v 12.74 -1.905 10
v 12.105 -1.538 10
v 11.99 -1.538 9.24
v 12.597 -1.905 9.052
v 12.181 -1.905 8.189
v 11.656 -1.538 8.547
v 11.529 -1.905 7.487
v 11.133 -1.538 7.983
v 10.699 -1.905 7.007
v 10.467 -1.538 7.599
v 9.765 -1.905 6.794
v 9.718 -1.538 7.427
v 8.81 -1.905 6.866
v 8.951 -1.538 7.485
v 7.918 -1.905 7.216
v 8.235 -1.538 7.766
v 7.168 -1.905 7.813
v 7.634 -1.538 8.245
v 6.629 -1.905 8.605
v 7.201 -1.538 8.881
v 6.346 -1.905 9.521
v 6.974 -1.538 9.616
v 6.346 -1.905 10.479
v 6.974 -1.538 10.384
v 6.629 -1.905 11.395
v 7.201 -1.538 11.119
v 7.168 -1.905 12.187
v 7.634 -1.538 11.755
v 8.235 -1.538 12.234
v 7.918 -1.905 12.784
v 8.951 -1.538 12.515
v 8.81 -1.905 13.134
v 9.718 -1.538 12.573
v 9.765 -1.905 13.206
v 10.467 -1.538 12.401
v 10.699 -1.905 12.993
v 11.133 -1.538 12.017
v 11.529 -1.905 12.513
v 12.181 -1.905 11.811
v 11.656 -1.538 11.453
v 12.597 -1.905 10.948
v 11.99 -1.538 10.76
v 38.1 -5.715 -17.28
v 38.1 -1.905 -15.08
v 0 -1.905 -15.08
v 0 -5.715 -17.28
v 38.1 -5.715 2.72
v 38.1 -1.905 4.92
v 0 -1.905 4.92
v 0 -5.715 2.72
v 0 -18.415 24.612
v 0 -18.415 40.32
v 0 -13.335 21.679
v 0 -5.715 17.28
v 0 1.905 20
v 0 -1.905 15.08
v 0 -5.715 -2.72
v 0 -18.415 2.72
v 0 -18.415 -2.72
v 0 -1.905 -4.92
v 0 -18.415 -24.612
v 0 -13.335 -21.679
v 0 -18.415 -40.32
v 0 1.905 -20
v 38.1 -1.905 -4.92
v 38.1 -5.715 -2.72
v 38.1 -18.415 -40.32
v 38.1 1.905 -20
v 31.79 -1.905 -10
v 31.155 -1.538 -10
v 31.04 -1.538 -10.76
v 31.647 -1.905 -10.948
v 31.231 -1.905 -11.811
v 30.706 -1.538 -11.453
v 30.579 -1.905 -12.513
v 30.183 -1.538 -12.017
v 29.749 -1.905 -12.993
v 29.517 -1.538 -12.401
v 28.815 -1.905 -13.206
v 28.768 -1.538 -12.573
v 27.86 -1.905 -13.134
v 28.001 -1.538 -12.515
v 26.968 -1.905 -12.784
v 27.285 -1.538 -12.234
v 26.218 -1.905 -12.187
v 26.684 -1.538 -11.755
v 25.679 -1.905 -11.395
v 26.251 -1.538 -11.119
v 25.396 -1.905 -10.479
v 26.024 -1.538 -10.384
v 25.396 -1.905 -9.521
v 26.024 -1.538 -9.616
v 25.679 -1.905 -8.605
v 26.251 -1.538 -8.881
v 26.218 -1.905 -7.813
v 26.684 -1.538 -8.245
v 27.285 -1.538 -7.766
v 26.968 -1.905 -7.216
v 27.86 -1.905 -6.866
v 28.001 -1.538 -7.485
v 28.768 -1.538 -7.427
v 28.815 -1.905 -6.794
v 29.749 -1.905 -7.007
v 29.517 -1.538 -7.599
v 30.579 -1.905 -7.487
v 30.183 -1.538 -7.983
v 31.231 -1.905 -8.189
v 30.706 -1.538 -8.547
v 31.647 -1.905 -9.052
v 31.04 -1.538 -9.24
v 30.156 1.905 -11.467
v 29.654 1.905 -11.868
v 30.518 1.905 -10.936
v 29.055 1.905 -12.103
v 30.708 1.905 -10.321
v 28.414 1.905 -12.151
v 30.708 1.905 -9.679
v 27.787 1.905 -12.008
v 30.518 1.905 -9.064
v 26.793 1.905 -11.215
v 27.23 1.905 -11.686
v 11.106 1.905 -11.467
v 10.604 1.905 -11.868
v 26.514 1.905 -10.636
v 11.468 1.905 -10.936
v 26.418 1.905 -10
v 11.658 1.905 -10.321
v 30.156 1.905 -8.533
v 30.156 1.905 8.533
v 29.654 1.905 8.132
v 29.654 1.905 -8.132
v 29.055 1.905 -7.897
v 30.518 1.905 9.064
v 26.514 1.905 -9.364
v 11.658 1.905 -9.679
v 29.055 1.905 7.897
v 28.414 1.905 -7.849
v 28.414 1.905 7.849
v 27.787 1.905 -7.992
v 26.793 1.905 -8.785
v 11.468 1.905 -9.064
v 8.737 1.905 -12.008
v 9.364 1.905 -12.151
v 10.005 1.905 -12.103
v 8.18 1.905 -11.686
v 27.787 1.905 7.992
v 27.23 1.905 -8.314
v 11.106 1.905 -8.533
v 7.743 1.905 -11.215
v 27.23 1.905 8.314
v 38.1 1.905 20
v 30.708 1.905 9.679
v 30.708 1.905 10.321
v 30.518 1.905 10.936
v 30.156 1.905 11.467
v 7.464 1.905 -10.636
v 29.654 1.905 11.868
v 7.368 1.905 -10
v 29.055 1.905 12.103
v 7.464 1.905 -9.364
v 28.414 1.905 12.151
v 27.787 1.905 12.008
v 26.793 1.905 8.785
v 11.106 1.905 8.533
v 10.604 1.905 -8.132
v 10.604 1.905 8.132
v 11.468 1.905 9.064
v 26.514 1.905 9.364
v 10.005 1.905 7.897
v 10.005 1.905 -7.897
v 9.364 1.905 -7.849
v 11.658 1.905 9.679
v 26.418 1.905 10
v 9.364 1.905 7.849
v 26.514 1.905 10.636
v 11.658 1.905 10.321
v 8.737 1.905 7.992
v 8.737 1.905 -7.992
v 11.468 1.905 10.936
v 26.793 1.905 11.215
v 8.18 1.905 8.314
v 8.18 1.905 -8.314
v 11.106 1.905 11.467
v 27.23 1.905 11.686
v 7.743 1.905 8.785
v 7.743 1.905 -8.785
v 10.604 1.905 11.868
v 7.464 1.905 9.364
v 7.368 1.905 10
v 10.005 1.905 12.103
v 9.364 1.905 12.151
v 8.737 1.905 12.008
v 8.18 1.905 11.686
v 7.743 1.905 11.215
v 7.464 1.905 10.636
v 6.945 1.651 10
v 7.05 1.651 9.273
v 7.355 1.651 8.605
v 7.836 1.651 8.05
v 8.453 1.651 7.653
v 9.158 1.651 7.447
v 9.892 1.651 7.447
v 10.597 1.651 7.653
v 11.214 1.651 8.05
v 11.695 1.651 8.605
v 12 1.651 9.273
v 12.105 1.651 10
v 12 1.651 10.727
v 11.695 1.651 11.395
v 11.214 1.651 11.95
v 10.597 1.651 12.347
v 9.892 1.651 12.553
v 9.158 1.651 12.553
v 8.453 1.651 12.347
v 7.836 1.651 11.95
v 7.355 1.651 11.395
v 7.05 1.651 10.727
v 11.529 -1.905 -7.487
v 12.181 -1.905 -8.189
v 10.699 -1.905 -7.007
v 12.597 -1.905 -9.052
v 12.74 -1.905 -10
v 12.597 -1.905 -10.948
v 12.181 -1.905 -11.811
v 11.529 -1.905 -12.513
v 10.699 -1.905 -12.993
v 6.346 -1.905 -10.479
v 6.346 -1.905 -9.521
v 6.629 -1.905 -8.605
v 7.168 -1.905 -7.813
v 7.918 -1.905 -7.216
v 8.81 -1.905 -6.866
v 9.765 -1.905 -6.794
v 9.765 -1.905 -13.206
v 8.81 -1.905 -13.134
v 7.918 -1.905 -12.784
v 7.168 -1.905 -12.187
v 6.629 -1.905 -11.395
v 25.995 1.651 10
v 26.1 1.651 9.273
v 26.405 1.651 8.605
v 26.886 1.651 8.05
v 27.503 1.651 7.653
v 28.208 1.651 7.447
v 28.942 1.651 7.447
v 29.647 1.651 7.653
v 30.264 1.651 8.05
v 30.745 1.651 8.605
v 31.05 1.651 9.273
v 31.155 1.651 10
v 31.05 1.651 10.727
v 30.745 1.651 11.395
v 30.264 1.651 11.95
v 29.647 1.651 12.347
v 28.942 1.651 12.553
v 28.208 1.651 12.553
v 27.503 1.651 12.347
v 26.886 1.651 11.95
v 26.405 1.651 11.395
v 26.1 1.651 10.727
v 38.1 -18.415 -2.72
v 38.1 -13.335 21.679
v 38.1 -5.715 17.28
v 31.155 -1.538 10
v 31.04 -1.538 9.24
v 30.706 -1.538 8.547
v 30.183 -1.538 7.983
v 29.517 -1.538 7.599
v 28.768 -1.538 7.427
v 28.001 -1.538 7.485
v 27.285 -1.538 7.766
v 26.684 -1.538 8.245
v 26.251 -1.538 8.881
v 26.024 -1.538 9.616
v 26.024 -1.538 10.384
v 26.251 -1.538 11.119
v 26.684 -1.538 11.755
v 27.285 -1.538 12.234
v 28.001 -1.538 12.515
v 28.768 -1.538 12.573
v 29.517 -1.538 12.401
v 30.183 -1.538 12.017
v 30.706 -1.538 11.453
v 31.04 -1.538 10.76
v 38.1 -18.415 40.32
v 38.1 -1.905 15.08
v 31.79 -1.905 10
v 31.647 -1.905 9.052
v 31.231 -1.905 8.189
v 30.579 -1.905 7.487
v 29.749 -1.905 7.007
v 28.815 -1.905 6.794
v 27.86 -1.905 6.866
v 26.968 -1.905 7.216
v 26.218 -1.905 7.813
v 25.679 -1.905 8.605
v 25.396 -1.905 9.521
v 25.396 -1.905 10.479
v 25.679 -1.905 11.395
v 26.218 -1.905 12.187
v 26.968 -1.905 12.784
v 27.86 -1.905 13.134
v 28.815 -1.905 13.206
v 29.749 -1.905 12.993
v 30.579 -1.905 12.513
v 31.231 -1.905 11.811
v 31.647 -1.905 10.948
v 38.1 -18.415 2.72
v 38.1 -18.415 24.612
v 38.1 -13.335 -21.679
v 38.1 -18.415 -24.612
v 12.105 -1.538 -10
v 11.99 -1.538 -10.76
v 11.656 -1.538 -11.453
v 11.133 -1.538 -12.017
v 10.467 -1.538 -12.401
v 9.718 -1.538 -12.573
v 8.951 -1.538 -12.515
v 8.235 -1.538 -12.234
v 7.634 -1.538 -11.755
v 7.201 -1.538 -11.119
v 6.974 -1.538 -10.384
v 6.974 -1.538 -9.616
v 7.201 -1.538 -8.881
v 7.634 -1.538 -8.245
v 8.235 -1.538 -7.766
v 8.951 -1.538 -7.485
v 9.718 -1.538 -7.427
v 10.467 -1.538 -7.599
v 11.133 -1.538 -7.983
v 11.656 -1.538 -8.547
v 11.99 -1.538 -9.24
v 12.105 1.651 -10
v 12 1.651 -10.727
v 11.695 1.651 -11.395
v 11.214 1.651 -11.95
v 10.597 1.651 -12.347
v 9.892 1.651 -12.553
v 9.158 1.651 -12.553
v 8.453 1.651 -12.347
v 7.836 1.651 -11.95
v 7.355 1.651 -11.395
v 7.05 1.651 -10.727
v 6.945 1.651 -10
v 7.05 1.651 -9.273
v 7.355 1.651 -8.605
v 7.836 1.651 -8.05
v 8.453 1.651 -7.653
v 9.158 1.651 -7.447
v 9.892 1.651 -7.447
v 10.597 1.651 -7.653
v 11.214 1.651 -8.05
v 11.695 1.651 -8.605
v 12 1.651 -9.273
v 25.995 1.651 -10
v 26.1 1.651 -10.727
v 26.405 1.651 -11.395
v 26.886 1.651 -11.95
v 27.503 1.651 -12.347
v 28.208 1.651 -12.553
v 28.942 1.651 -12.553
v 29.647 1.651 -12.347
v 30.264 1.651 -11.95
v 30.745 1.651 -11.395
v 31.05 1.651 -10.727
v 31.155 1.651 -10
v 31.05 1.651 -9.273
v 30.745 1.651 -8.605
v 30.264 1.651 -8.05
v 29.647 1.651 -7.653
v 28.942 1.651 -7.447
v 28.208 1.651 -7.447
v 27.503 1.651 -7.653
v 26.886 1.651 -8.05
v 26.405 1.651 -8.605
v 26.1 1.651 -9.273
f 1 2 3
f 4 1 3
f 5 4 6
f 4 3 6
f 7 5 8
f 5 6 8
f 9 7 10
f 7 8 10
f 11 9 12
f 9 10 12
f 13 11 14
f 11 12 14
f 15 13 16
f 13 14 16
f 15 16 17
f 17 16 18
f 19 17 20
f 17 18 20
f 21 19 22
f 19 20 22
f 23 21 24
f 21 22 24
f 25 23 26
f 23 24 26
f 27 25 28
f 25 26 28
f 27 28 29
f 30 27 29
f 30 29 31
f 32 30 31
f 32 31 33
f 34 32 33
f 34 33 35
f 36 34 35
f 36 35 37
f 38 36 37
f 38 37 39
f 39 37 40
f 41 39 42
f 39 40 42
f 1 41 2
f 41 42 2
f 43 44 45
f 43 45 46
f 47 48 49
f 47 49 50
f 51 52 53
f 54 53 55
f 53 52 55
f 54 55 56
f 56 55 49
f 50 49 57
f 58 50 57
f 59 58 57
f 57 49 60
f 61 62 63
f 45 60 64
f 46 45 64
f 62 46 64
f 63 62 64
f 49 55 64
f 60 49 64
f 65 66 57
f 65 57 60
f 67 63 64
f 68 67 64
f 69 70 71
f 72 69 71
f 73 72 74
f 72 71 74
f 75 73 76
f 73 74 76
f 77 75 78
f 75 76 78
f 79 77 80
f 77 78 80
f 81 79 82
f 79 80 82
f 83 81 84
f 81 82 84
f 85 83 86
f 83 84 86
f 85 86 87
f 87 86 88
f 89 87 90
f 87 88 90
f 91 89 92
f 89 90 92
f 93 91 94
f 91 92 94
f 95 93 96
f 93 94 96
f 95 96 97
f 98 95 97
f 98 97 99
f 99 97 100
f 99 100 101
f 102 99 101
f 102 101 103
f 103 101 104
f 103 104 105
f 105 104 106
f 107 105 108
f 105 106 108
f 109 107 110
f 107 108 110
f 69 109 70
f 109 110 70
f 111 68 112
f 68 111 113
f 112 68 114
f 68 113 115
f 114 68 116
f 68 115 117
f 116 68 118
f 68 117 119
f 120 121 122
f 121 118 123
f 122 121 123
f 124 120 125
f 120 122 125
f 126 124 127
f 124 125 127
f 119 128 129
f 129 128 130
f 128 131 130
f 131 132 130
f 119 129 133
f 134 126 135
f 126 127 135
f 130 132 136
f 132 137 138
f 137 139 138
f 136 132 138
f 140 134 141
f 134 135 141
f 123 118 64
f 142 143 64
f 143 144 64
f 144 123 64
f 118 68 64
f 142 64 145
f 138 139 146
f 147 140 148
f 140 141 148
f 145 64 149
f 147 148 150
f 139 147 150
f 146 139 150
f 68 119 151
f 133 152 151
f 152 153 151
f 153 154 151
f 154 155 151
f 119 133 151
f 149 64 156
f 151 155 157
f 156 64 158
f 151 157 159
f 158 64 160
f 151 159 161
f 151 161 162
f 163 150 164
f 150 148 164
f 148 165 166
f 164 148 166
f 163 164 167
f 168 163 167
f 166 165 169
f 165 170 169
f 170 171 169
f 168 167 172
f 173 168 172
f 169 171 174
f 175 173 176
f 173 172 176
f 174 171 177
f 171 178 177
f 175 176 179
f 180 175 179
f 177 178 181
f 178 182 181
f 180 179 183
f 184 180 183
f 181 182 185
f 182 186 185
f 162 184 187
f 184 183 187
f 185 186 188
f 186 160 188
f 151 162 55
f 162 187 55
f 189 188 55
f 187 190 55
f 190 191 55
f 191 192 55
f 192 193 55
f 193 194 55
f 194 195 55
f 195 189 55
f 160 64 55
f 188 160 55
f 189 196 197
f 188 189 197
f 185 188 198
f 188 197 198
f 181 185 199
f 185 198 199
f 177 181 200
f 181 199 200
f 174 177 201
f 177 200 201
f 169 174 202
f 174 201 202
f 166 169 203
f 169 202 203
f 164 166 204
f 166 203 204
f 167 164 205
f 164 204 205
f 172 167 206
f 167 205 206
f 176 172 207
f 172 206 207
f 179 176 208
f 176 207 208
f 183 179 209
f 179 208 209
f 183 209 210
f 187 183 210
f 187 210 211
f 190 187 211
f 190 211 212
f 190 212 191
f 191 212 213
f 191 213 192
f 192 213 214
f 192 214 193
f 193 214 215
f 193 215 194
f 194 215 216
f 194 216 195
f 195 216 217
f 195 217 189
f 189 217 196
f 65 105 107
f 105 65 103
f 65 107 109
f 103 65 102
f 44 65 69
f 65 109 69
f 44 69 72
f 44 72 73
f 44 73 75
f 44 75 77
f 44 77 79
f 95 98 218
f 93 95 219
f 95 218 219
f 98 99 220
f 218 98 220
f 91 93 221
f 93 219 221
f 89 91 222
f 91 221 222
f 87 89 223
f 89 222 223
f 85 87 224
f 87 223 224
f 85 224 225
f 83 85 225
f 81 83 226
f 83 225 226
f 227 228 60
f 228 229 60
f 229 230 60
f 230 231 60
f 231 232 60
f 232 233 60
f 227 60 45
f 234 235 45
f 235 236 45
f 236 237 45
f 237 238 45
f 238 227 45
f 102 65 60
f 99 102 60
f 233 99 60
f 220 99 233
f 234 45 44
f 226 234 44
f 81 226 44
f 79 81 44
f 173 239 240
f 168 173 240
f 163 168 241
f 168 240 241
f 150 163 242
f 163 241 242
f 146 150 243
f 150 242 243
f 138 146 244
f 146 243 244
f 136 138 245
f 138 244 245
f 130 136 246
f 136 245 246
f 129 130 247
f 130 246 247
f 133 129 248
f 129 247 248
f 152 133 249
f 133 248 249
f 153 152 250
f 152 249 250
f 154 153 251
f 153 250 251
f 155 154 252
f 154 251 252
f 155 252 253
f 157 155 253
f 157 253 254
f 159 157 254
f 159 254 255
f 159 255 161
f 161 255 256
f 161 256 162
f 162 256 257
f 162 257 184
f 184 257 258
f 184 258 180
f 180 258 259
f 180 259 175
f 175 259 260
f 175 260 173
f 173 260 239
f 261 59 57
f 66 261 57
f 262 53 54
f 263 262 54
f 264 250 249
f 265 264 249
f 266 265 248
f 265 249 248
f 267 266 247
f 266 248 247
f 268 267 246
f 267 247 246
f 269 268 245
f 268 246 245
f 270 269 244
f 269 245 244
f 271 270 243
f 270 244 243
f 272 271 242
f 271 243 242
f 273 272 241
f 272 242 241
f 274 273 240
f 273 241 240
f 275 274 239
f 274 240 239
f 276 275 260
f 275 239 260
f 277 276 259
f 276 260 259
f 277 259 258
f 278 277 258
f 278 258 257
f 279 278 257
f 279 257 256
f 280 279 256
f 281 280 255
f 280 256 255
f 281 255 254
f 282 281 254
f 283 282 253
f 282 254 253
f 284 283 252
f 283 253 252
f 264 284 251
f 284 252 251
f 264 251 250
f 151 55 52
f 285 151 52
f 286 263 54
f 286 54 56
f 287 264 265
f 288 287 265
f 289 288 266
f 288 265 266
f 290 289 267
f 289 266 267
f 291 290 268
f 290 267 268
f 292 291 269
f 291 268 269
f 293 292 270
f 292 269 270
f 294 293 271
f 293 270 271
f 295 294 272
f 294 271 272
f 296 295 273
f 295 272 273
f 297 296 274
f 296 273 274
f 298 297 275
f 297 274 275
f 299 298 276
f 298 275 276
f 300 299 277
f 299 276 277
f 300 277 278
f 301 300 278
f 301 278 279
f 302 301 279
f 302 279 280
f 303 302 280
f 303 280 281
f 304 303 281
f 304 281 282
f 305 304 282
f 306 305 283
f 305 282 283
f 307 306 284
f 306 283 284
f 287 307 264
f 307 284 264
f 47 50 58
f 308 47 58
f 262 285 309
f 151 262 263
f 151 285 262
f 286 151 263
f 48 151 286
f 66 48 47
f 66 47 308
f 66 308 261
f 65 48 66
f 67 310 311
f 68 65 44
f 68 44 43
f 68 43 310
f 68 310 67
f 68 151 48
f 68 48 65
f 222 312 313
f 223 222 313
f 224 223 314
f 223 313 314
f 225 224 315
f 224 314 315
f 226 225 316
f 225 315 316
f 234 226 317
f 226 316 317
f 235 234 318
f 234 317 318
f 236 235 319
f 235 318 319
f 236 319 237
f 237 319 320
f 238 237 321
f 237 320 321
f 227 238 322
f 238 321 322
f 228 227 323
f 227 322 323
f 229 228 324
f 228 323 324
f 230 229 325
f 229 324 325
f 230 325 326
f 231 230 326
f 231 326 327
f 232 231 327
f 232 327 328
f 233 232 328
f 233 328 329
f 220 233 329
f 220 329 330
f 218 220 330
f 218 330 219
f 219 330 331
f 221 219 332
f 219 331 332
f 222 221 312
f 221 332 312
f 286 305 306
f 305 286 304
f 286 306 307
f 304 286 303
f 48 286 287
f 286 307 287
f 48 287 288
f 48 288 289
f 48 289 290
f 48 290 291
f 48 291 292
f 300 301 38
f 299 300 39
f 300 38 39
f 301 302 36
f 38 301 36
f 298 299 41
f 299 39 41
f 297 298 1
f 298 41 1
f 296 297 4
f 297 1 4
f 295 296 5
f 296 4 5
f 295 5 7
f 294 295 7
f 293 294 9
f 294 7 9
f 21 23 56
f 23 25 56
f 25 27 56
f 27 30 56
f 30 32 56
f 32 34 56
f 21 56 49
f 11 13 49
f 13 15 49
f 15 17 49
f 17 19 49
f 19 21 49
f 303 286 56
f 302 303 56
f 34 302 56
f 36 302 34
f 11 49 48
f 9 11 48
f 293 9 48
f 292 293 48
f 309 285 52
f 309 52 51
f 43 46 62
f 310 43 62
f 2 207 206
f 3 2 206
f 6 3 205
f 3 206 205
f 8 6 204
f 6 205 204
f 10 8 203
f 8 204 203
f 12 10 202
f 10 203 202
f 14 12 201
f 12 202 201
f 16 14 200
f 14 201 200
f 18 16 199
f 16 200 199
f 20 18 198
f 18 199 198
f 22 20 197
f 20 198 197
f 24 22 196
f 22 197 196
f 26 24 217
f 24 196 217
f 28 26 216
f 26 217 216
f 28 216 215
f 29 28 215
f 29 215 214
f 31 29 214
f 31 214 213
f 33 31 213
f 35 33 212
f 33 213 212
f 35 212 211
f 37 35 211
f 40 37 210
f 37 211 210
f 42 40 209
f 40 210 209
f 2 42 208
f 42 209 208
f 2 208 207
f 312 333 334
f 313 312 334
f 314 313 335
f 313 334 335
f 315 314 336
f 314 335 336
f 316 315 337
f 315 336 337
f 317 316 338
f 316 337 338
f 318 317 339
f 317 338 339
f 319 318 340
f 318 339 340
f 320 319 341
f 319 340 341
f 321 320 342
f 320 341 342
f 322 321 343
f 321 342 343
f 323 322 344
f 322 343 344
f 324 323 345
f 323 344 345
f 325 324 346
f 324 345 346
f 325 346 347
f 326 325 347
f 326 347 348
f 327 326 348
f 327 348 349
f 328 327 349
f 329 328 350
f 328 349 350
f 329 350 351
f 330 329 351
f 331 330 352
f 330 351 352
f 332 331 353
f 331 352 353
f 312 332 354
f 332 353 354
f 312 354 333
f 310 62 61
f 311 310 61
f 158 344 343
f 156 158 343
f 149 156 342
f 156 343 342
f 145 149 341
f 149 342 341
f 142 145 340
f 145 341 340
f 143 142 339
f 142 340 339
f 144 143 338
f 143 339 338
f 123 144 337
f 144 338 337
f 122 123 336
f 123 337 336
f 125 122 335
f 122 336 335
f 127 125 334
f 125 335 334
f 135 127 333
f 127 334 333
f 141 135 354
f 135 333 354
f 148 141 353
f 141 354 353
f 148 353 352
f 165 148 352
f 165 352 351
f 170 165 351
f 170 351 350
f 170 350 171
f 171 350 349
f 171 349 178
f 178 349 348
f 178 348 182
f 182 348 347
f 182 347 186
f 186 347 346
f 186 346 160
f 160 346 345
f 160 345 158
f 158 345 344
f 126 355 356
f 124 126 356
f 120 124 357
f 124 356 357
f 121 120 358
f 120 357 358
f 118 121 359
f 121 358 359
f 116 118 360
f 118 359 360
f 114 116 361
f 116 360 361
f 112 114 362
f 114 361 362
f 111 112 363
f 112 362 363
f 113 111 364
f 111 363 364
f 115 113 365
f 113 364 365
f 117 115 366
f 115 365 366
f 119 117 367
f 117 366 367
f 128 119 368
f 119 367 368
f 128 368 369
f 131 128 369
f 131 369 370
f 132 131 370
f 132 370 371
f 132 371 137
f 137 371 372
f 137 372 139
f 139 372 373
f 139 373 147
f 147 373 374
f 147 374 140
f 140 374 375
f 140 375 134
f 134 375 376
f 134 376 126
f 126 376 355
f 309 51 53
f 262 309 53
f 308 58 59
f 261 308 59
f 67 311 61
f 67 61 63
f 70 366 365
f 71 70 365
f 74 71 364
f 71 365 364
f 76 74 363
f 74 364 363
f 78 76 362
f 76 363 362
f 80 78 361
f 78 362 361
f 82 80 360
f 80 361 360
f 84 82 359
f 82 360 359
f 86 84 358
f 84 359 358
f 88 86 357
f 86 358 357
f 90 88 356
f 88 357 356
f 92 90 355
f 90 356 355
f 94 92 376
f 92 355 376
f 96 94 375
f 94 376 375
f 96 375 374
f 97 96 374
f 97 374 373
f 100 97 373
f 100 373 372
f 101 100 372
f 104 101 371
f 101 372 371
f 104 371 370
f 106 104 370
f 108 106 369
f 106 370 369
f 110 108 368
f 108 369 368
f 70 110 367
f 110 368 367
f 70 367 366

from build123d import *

# Parameters (mm, degrees)
BODY_DEPTH                           = 38.1
F_13_64_0_20313_DIAMETER_HOLE1_D     = 5.159502
F_13_64_0_20313_DIAMETER_HOLE1_DEPTH = 3.556
F_13_64_0_20313_DIAMETER_HOLE1_TIP   = 1.550070783
CHAMFER1_SIZE                        = 0.635
CHAMFER1_SIZE2                       = 0.366617421
CHAMFER1_PART_2_SIZE                 = 0.635
CHAMFER1_PART_2_SIZE2                = 0.366617421


with BuildPart() as part:
    # Profile → Body (new body)
    with BuildSketch(Plane(origin=(0, 0, 0), x_dir=(0, 0, -1), z_dir=(1, 0, 0))):
        Polygon((20, 1.905), (-20, 1.905), (-23.81, -1.905), (-27.62, -5.715), (-35.24, -13.335), (-40.32, -18.415), (-24.612052944, -18.415), (-21.679113577, -13.335), (-17.279704526, -5.715), (-15.08, -1.905), (-14.6, -1.905), (-5.4, -1.905), (-4.92, -1.905), (-2.720295474, -5.715), (-2.720295474, -13.335), (-2.720295474, -18.415), (2.720295474, -18.415), (2.720295474, -13.335), (2.720295474, -5.715), (4.92, -1.905), (5.4, -1.905), (14.6, -1.905), (15.08, -1.905), (17.279704526, -5.715), (21.679113577, -13.335), (24.612052944, -18.415), (40.32, -18.415), (35.24, -13.335), (27.62, -5.715), (23.81, -1.905), align=None)
    extrude(amount=BODY_DEPTH)

    # 13/64 (0.20313) Diameter Hole1
    with Locations(Plane(origin=(0, -1.905, 0), x_dir=(-1, 0, 0), z_dir=(0, -1, 0))):
        with Locations((-9.525, 10), (-9.525, -10), (-28.575, -10), (-28.575, 10)):
            Hole(F_13_64_0_20313_DIAMETER_HOLE1_D / 2, depth=F_13_64_0_20313_DIAMETER_HOLE1_DEPTH)
            with Locations((0, 0, -(F_13_64_0_20313_DIAMETER_HOLE1_DEPTH + F_13_64_0_20313_DIAMETER_HOLE1_TIP / 2))):  # 118° drill point
                Cone(0, F_13_64_0_20313_DIAMETER_HOLE1_D / 2, F_13_64_0_20313_DIAMETER_HOLE1_TIP, mode=Mode.SUBTRACT)

    # Chamfer1
    chamfer1_edges = [part.edges().sort_by_distance(p)[0] for p in [
        (25.995249, -1.905, -10),
        (6.945249, -1.905, -10),
    ]]
    chamfer1_side = [part.faces().sort_by_distance(p)[0] for p in [
        (19.05, -1.905, -10),
    ]]
    chamfer(chamfer1_edges, length=CHAMFER1_SIZE, length2=CHAMFER1_SIZE2, reference=chamfer1_side[0])

    # Chamfer1 part 2
    chamfer1_part_2_edges = [part.edges().sort_by_distance(p)[0] for p in [
        (25.995249, -1.905, 10),
        (6.945249, -1.905, 10),
    ]]
    chamfer1_part_2_side = [part.faces().sort_by_distance(p)[0] for p in [
        (19.05, -1.905, 10),
    ]]
    chamfer(chamfer1_part_2_edges, length=CHAMFER1_PART_2_SIZE, length2=CHAMFER1_PART_2_SIZE2, reference=chamfer1_part_2_side[0])


solid = part.part
